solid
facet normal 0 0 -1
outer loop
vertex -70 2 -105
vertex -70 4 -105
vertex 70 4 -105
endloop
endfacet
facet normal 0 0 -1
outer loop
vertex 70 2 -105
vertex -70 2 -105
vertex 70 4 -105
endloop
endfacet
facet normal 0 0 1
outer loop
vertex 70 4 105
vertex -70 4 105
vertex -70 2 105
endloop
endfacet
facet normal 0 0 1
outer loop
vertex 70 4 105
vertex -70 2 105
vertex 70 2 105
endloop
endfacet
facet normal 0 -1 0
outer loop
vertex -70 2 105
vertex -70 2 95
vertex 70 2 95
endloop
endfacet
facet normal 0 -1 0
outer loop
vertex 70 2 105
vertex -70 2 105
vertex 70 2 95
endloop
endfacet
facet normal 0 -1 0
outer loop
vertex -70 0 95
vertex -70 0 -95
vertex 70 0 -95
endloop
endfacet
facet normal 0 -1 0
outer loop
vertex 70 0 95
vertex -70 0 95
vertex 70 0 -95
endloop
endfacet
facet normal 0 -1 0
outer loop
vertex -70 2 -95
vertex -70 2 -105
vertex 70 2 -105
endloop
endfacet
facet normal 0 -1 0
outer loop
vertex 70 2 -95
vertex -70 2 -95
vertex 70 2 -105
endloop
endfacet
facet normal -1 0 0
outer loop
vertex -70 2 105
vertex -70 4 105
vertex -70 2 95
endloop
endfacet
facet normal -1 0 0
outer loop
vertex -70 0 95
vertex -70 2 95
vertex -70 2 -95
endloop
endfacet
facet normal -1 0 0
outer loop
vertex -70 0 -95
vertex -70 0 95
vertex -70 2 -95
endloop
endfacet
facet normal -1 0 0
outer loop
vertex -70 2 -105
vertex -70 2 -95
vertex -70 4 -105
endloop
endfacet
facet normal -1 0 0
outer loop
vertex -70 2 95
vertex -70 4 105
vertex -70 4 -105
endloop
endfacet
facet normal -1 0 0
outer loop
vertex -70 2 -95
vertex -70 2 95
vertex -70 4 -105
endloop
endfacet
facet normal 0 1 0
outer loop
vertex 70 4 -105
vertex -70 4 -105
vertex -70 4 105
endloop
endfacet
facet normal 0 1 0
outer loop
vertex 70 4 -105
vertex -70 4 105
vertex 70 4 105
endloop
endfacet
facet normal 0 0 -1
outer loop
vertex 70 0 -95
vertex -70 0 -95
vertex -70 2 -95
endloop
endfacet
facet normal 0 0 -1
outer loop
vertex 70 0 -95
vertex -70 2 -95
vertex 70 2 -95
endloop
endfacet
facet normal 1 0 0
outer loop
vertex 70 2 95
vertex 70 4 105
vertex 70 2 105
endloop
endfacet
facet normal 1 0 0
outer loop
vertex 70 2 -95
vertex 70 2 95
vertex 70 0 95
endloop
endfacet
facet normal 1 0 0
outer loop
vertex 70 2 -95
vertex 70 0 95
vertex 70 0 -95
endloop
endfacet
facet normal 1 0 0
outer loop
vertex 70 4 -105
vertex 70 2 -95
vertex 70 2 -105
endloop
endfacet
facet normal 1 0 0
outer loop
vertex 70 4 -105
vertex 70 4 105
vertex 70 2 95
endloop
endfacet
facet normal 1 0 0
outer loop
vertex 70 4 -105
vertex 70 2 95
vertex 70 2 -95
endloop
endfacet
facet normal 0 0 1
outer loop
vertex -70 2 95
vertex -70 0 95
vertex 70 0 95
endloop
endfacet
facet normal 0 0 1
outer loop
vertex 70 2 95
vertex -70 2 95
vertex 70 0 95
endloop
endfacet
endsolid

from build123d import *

# Parameters (mm, degrees)
SKETCH2_W               = 140
SKETCH2_H               = 420
BOSS_EXTRUDE1_DEPTH     = 4
BOSS_EXTRUDE2_DEPTH     = 25
SKETCH4_W               = 10.25
SKETCH4_H               = 80.25
CUT_EXTRUDE1_DEPTH      = 25.4
SKETCH7_W               = 130
SKETCH7_H               = 10
CUT_EXTRUDE2_DEPTH      = 2.45
SKETCH9_W               = 140
SKETCH9_H               = 115
SKETCH9_W_2             = 10.25
SKETCH9_H_2             = 80.25
CUT_EXTRUDE3_DEPTH      = 1
CUT_EXTRUDE3_DEPTH_BACK = 30
SKETCH10_W              = 140
SKETCH10_H              = 10
BOSS_EXTRUDE3_DEPTH     = 2


with BuildPart() as part:
    # Sketch2 → Boss-Extrude1 (new body)
    with BuildSketch(Plane(origin=(0, 0, 0), x_dir=(1, 0, 0), z_dir=(0, 1, 0))):
        Rectangle(SKETCH2_W, SKETCH2_H)
    extrude(amount=BOSS_EXTRUDE1_DEPTH)

    # Sketch3 → Boss-Extrude2 (add)
    with BuildSketch(Plane(origin=(0, 4, 0), x_dir=(1, 0, 0), z_dir=(0, 1, 0))):
        with BuildLine():
            Line((-37.5, -165), (-37.5, -145))
            Line((-37.5, -145), (-43.5, -145))
            Line((-43.5, -145), (-43.5, -165))
            ThreePointArc((-43.5, -165), (0, -208.5), (43.5, -165))
            Line((43.5, -165), (43.5, -145))
            Line((43.5, -145), (37.5, -145))
            Line((37.5, -145), (37.5, -165))
            ThreePointArc((37.5, -165), (0, -202.5), (-37.5, -165))
        make_face()
    extrude(amount=BOSS_EXTRUDE2_DEPTH)

    # Sketch4 → Cut-Extrude1 (cut)
    with BuildSketch(Plane(origin=(0, 4, 0), x_dir=(1, 0, 0), z_dir=(0, 1, 0))):
        with Locations((-59.875, 139.875)):
            Rectangle(SKETCH4_W, SKETCH4_H)
        with Locations((59.875, 139.875)):
            Rectangle(SKETCH4_W, SKETCH4_H)
    extrude(amount=-CUT_EXTRUDE1_DEPTH, mode=Mode.SUBTRACT)

    # Sketch7 → Cut-Extrude2 (cut)
    with BuildSketch(Plane(origin=(0, 4, 0), x_dir=(1, 0, 0), z_dir=(0, 1, 0))):
        with Locations((0, 200)):
            Rectangle(SKETCH7_W, SKETCH7_H)
    extrude(amount=-CUT_EXTRUDE2_DEPTH, mode=Mode.SUBTRACT)

    # Sketch9 → Cut-Extrude3 (cut, two sides)
    with BuildSketch(Plane.XZ) as cut_extrude3_sk:
        with Locations((0, 152.5)):
            Rectangle(SKETCH9_W, SKETCH9_H)
        with Locations((0, -152.5)):
            Rectangle(SKETCH9_W, SKETCH9_H)
        with Locations((-59.875, -139.875)):
            Rectangle(SKETCH9_W_2, SKETCH9_H_2, mode=Mode.SUBTRACT)
        with Locations((59.875, -139.875)):
            Rectangle(SKETCH9_W_2, SKETCH9_H_2, mode=Mode.SUBTRACT)
    extrude(amount=CUT_EXTRUDE3_DEPTH, mode=Mode.SUBTRACT)
    extrude(cut_extrude3_sk.sketch, amount=-CUT_EXTRUDE3_DEPTH_BACK, mode=Mode.SUBTRACT)

    # Sketch10 → Boss-Extrude3 (add)
    with BuildSketch(Plane(origin=(0, 4, 0), x_dir=(1, 0, 0), z_dir=(0, 1, 0))):
        with Locations((0, 100)):
            Rectangle(SKETCH10_W, SKETCH10_H)
        with Locations((0, -100)):
            Rectangle(SKETCH10_W, SKETCH10_H)
    extrude(amount=-BOSS_EXTRUDE3_DEPTH)


solid = part.part
